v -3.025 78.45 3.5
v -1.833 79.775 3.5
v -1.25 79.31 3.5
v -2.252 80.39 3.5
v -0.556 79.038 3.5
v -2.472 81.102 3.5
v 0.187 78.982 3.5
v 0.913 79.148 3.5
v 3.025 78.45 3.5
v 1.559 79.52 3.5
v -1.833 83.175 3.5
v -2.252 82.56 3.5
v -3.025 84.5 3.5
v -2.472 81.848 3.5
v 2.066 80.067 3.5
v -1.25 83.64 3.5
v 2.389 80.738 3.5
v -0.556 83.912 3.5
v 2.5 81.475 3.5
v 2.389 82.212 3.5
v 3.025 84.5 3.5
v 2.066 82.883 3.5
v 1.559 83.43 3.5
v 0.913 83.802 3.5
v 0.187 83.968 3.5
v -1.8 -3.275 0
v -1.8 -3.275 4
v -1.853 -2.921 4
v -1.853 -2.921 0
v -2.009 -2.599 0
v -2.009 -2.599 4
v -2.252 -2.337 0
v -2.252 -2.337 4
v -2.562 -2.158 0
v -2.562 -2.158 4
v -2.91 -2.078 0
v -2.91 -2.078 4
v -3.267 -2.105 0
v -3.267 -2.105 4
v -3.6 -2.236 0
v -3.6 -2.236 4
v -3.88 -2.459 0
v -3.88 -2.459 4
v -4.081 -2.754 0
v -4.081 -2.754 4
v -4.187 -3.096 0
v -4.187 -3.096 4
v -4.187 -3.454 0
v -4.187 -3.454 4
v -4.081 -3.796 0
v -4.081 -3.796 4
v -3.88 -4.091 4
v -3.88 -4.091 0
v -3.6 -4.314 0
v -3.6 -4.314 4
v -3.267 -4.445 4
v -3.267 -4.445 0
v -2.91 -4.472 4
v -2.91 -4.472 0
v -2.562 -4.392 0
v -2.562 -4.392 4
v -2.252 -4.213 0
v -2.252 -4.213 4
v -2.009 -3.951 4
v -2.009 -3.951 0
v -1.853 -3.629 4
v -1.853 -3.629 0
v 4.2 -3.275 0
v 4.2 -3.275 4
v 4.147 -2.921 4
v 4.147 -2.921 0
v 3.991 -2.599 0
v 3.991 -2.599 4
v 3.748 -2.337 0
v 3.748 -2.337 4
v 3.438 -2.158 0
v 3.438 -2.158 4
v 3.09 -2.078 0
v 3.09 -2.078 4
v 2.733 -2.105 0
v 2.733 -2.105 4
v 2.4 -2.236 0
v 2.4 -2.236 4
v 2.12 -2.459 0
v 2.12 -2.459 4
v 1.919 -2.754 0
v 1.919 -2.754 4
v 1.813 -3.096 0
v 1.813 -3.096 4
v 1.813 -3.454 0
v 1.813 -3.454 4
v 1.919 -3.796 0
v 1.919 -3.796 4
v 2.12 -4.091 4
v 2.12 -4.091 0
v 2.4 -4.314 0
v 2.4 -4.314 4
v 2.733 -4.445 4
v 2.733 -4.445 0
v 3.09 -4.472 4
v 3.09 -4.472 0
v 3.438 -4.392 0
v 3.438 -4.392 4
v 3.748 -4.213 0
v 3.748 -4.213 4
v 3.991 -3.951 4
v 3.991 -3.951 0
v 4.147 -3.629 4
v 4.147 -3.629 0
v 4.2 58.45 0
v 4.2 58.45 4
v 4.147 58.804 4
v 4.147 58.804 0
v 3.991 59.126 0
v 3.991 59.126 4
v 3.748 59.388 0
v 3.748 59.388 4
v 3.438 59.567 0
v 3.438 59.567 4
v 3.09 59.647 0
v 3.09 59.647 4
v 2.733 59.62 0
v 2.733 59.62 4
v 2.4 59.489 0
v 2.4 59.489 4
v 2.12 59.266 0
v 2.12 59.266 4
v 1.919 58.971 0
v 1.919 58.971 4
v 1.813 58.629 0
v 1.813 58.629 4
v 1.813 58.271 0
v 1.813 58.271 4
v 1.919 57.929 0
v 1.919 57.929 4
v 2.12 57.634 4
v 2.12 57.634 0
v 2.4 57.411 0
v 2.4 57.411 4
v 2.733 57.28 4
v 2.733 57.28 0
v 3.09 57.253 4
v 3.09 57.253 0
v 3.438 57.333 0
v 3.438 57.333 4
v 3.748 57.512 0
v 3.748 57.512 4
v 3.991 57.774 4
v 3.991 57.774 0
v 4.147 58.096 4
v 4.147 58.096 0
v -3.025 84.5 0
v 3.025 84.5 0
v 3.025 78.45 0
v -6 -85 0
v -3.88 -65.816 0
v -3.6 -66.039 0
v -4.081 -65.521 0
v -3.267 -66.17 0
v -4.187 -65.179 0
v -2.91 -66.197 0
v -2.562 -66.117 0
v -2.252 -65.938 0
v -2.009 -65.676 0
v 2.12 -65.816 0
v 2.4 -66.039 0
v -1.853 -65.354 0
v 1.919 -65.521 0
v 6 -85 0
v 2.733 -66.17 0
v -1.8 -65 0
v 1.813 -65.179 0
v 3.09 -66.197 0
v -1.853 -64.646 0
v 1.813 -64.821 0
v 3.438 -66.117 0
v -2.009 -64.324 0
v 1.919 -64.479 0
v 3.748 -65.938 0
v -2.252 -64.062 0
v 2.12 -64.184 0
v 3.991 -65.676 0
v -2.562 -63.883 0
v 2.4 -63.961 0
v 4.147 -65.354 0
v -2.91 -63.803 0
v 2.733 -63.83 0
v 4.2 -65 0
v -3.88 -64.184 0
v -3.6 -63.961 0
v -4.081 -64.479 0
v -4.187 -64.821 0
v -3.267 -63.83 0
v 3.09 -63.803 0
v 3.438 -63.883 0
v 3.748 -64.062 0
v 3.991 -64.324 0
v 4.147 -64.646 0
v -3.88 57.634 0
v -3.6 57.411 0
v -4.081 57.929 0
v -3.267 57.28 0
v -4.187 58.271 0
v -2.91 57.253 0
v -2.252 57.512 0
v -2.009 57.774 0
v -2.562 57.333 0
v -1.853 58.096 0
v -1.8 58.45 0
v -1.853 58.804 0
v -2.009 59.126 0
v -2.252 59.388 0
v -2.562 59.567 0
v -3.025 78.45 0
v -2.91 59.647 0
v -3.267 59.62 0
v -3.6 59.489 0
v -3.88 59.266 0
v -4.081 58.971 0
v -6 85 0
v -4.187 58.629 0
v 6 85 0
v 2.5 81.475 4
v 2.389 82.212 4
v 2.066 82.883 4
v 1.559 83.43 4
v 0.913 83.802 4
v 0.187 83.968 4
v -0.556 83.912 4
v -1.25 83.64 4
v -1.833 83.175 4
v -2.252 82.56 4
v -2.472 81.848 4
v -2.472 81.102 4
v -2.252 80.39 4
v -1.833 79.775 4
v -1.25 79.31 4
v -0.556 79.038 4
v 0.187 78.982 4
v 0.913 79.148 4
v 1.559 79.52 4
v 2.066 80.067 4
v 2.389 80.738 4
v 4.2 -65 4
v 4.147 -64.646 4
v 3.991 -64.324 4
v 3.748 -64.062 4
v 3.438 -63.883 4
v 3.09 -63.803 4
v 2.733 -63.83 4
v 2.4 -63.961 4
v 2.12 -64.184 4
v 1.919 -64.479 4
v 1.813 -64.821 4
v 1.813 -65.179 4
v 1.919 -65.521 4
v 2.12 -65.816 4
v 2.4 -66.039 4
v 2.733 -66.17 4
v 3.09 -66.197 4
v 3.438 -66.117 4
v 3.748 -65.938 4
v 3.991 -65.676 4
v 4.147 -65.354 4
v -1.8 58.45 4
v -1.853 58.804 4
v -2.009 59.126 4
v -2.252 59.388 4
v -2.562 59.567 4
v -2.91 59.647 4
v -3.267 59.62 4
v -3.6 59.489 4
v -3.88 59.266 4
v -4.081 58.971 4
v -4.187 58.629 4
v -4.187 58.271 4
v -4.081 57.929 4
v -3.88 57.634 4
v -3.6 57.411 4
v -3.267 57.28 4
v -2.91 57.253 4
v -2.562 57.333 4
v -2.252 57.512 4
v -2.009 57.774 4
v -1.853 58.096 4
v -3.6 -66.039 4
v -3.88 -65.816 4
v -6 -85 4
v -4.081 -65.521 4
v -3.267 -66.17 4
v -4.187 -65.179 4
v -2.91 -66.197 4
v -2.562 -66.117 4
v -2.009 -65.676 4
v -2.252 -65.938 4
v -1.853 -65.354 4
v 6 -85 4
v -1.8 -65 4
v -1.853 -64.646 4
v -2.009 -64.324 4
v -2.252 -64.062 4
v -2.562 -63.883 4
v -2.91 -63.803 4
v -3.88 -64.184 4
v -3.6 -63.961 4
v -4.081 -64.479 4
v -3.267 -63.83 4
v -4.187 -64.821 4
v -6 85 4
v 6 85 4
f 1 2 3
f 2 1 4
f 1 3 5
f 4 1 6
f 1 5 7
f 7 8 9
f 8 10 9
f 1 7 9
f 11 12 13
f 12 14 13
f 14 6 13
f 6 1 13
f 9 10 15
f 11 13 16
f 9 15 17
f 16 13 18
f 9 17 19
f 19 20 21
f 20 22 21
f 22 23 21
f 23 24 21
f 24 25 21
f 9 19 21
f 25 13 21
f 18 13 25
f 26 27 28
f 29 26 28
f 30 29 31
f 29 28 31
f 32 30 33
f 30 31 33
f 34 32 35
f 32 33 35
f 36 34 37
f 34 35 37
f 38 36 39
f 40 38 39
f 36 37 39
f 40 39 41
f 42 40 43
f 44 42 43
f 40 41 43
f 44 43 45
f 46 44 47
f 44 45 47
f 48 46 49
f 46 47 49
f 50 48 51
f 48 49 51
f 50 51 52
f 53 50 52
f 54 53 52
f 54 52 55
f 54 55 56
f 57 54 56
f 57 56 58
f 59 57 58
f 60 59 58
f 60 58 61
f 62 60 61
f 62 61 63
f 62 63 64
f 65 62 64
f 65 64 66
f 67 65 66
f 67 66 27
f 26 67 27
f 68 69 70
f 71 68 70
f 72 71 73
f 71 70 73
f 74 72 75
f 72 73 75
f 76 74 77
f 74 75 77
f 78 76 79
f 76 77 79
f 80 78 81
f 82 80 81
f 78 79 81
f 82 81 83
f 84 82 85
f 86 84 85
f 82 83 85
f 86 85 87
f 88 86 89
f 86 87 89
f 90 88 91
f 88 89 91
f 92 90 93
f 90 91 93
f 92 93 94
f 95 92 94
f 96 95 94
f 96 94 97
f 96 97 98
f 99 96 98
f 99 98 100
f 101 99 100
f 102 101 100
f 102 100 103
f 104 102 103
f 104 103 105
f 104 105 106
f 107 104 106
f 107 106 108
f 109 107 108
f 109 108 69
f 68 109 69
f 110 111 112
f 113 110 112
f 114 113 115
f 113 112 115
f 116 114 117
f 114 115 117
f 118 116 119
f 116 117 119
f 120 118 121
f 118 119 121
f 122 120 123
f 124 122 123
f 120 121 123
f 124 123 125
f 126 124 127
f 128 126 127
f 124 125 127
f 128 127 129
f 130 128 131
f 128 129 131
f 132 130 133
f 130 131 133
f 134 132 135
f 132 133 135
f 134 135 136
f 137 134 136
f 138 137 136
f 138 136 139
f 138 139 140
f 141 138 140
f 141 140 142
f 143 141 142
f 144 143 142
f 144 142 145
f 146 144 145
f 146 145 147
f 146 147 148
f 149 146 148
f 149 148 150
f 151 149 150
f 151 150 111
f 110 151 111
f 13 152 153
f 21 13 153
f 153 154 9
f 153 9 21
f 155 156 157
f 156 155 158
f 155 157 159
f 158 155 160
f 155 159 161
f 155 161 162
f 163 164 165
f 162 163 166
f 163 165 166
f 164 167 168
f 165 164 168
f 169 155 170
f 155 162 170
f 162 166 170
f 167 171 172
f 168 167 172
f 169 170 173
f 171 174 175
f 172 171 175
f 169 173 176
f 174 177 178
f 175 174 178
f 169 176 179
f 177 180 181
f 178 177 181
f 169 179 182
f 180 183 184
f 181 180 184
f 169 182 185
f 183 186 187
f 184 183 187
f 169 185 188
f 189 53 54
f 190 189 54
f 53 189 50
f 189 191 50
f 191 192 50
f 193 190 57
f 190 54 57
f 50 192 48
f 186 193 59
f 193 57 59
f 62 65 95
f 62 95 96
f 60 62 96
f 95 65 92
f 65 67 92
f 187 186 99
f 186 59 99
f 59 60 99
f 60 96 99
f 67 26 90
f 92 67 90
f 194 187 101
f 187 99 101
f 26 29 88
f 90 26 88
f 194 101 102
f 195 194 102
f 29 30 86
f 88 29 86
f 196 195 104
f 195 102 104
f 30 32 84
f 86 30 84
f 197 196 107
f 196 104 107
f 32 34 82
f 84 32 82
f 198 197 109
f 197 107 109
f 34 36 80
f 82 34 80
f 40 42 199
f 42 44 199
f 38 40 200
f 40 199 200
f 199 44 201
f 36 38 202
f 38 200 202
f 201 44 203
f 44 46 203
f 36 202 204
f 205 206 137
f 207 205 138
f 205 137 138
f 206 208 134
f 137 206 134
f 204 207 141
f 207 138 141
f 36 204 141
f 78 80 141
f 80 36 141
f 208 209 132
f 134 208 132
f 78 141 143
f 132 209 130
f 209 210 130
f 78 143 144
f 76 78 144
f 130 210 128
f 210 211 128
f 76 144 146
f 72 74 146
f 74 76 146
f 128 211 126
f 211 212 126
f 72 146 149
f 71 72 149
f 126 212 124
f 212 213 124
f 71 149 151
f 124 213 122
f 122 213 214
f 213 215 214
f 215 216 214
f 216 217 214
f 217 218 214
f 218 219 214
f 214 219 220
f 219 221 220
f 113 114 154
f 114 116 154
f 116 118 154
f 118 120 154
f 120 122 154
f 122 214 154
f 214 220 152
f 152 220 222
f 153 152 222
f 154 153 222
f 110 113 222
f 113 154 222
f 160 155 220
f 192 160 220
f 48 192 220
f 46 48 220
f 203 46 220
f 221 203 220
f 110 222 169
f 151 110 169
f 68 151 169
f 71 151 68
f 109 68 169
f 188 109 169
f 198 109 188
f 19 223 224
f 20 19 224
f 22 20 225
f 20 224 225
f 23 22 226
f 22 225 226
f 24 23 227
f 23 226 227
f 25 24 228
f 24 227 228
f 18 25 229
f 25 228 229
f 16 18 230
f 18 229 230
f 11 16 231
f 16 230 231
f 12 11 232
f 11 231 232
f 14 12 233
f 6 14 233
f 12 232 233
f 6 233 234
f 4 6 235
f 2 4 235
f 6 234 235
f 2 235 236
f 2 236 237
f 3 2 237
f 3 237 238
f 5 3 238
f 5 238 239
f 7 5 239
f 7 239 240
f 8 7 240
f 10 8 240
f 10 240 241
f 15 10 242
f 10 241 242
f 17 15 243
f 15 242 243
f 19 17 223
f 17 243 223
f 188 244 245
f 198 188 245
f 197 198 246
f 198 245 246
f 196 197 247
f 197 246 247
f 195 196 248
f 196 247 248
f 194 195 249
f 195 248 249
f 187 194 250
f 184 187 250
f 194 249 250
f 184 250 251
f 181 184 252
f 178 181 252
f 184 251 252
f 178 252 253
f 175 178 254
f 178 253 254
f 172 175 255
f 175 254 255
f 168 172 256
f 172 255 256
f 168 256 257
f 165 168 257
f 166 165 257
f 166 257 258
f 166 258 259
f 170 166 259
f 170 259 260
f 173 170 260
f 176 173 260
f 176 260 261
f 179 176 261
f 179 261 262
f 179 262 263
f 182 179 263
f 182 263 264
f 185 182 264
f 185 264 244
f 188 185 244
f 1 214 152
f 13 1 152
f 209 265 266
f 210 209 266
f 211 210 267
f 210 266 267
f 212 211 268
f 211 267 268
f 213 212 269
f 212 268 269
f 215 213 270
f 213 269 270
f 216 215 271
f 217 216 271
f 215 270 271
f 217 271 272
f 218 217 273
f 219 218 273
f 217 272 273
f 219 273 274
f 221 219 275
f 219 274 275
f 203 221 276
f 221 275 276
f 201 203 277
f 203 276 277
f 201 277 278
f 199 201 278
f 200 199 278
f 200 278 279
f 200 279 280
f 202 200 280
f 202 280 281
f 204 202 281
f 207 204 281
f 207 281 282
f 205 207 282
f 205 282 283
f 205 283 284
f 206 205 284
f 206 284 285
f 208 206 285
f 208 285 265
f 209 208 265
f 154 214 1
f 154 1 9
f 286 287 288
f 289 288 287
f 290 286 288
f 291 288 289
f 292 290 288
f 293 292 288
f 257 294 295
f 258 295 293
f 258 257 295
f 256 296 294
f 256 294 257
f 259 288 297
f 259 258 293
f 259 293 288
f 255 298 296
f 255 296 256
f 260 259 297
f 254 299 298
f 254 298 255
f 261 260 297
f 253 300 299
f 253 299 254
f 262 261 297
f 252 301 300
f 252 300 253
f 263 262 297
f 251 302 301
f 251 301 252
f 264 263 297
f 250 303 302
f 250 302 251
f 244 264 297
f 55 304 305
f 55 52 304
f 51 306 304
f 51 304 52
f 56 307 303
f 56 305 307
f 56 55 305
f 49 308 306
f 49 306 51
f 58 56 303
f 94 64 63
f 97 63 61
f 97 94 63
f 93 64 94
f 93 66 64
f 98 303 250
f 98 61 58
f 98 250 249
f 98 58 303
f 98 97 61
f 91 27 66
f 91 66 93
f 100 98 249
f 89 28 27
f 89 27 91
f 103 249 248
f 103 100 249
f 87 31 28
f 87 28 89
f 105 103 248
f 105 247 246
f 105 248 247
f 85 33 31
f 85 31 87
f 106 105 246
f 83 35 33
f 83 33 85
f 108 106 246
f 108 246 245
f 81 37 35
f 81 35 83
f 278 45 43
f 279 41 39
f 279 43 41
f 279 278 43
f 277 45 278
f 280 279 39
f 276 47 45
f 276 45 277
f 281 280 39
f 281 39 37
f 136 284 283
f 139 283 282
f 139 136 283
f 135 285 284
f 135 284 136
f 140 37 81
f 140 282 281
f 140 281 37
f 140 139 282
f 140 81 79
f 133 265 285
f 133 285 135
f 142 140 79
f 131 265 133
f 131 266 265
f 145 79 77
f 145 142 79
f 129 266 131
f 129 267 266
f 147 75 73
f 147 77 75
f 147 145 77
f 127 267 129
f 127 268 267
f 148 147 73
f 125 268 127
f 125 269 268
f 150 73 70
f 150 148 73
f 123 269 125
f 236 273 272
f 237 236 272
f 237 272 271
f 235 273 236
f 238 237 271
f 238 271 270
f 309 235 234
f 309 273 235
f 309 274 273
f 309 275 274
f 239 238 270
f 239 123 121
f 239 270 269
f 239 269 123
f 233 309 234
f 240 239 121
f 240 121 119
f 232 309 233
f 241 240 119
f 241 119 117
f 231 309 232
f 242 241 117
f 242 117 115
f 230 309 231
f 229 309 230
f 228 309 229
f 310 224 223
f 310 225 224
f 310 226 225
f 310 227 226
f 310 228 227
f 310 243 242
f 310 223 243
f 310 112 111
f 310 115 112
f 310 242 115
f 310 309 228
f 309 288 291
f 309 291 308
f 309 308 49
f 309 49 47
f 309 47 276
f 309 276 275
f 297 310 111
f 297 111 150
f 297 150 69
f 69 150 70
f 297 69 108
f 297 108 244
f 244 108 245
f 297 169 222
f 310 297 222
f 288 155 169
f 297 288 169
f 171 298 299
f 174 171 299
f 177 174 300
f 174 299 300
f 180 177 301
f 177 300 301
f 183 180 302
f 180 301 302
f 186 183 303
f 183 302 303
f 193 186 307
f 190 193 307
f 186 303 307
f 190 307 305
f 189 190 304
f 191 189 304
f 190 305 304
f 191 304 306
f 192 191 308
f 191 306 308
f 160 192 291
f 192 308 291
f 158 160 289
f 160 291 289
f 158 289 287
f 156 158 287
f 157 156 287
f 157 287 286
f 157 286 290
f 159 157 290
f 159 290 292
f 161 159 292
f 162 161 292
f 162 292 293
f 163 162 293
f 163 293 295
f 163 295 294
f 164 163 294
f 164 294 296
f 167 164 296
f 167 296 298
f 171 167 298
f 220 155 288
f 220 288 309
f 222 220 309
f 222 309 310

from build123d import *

# Parameters (mm, degrees)
SKETCH_W     = 12
SKETCH_H     = 170
SKETCH_W_2   = 6.05
SKETCH_H_2   = 6.05
PAD_DEPTH    = 4
SKETCH001_W  = 6.05
SKETCH001_H  = 6.05
PAD001_DEPTH = 0.5
SKETCH002_R  = 2.5
POCKET_DEPTH = 0.5
SKETCH003_R  = 1.2
HOLE_DEPTH   = 25


with BuildPart() as part:
    # Sketch → Pad (new body)
    with BuildSketch(Plane.XY):
        Rectangle(SKETCH_W, SKETCH_H)
        with Locations((0, 81.475)):
            Rectangle(SKETCH_W_2, SKETCH_H_2, mode=Mode.SUBTRACT)
    extrude(amount=PAD_DEPTH)

    # Sketch001 (on Face10 of Pad) → Pad001 (join)
    with BuildSketch(Plane.XY.offset(4)):
        with Locations((0, 81.475)):
            Rectangle(SKETCH001_W, SKETCH001_H)
    extrude(amount=-PAD001_DEPTH)

    # Sketch002 (on Face11 of Pad001) → Pocket (cut)
    with BuildSketch(Plane.XY.offset(4)):
        with Locations((0, 81.475)):
            Circle(SKETCH002_R)
    extrude(amount=-POCKET_DEPTH, mode=Mode.SUBTRACT)

    # Sketch003 (on Face5 of Pocket) → Hole (cut)
    with BuildSketch(Plane.XY.offset(4)):
        with Locations((3, 58.45)):
            Circle(SKETCH003_R)
        with Locations((-3, 58.45)):
            Circle(SKETCH003_R)
        with Locations((3, -3.275)):
            Circle(SKETCH003_R)
        with Locations((-3, -3.275)):
            Circle(SKETCH003_R)
        with Locations((3, -65)):
            Circle(SKETCH003_R)
        with Locations((-3, -65)):
            Circle(SKETCH003_R)
    extrude(amount=-HOLE_DEPTH, mode=Mode.SUBTRACT)


solid = part.part
